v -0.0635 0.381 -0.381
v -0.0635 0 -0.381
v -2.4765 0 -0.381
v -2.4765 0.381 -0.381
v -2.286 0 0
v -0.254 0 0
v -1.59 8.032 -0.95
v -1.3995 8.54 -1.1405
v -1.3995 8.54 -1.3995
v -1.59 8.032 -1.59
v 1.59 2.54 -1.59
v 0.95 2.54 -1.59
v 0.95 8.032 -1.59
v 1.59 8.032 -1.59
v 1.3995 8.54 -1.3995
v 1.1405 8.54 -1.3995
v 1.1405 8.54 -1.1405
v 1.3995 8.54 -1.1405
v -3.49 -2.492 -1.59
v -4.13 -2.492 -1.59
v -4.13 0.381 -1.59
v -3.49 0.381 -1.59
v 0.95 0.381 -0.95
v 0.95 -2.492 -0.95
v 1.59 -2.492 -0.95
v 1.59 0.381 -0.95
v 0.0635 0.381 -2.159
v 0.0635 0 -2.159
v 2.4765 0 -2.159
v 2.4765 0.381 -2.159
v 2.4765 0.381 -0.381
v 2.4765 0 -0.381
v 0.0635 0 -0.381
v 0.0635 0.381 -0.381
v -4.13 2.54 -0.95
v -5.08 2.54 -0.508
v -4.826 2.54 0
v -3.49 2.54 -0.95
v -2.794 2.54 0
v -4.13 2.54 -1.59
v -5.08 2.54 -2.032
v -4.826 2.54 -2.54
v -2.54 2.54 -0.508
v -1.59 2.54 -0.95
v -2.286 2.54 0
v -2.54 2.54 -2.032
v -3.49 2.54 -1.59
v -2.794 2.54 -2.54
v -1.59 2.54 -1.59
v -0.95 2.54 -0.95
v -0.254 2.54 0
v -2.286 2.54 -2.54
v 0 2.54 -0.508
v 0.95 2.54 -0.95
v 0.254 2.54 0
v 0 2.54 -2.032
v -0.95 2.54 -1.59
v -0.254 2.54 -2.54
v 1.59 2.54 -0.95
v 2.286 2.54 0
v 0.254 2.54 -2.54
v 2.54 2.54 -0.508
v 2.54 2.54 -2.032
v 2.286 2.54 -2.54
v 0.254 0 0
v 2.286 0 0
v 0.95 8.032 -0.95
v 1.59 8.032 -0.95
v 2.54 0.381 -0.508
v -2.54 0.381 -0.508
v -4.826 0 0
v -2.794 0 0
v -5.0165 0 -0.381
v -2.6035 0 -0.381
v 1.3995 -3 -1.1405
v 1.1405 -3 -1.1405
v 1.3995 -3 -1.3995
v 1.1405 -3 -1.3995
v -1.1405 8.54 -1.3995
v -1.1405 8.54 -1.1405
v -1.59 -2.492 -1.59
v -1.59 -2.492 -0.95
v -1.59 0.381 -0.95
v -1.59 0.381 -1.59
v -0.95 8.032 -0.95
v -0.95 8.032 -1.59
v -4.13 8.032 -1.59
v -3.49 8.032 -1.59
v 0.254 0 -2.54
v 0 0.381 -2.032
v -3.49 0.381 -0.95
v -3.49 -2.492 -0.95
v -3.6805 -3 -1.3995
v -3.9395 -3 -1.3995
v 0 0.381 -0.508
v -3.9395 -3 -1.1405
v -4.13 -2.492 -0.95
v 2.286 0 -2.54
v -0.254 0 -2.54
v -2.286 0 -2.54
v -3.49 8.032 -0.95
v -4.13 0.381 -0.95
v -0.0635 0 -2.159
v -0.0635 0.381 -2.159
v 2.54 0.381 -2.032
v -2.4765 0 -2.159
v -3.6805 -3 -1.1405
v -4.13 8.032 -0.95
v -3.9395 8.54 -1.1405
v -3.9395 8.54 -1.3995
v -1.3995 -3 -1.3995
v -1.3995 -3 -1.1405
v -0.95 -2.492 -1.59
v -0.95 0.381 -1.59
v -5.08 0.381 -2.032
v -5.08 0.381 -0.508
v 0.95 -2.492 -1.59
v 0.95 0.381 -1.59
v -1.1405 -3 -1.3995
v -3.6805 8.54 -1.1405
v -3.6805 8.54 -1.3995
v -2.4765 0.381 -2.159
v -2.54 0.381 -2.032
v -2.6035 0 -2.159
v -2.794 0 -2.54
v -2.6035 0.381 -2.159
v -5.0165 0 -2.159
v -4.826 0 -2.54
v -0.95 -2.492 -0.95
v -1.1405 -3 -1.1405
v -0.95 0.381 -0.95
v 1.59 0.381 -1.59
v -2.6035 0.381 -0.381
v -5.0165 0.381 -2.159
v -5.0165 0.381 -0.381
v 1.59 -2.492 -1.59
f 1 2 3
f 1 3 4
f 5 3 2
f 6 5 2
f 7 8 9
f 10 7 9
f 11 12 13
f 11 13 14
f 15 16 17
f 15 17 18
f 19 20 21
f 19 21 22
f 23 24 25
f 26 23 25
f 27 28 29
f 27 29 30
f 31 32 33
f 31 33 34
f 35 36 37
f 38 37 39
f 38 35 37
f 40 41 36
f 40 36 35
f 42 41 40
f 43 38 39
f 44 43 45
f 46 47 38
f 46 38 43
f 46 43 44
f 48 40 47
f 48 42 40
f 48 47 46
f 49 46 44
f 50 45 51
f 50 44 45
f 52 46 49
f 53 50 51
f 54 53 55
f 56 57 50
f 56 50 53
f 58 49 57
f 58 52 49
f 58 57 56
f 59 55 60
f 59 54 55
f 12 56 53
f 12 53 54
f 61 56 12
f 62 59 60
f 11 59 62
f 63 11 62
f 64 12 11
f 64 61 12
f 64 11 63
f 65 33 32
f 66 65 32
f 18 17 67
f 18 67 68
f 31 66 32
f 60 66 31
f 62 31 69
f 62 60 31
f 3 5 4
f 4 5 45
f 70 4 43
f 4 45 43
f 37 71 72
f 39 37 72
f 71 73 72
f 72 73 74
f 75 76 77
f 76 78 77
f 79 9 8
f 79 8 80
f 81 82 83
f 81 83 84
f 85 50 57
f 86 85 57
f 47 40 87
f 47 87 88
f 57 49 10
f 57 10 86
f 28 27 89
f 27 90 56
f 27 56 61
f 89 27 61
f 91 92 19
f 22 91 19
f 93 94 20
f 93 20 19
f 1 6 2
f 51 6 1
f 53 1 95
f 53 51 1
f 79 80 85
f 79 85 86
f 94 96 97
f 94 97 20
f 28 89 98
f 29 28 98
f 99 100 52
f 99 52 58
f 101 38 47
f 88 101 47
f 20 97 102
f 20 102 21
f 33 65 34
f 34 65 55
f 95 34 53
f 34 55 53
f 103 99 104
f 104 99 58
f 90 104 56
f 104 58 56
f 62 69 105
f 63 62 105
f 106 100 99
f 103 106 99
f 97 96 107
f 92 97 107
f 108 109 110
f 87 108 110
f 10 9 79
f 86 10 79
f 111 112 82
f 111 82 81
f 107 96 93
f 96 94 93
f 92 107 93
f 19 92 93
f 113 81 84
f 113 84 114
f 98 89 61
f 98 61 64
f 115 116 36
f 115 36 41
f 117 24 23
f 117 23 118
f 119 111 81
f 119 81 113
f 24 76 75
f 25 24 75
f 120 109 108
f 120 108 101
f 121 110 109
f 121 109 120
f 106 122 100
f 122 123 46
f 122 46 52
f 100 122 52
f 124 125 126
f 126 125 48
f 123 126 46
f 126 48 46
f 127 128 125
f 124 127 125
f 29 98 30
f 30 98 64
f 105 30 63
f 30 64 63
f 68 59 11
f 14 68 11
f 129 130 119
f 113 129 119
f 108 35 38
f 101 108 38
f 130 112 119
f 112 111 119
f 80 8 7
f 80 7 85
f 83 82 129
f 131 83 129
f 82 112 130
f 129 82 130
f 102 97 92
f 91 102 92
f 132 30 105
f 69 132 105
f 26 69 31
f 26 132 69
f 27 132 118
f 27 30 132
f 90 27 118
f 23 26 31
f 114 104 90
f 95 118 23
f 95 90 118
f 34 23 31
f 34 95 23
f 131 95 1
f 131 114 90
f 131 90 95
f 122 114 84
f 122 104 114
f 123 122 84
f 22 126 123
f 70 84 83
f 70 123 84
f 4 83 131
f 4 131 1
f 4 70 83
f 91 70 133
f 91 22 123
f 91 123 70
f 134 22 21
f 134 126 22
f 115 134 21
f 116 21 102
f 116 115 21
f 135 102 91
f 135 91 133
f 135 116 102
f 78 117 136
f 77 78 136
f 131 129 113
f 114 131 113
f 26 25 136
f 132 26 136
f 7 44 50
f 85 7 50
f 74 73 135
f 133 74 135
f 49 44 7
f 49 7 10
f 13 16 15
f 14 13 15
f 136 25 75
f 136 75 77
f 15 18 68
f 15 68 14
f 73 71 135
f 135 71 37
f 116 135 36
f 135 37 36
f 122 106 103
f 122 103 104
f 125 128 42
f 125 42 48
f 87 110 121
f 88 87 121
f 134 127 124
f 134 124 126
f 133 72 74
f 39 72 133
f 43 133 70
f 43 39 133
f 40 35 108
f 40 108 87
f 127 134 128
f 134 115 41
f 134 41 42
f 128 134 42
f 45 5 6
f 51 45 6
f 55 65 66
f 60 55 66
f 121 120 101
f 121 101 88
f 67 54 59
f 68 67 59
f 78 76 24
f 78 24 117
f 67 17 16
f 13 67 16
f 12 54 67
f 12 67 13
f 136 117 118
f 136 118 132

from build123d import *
from OCP.BRepFilletAPI import BRepFilletAPI_MakeChamfer

# Parameters (mm, degrees)
SKETCH1_W                     = 2.54
SKETCH1_H                     = 2.54
MAIN_BODY_DEPTH               = 2.54
SKETCH3_W                     = 1.778
SKETCH3_H                     = 0.381
CUT_EXTRUDE1_DEPTH            = 5.399409051
CUT_EXTRUDE2_DEPTH            = 5.399409051
BODY_PATTERN_COUNT            = 3
BODY_PATTERN_PITCH            = 2.54
PIN_START                     = -5.54
SKETCH2_W                     = 0.64
SKETCH2_H                     = 0.64
PIN_DEPTH                     = 11.54
CHAMFER1_SIZE                 = 0.508
CHAMFER1_SIZE2                = 0.1905
CHAMFER2_SIZE                 = 0.1905
CHAMFER2_SIZE2                = 0.508
PIN_PATTERN_COUNT             = 3
PIN_PATTERN_PITCH             = 2.54
CHAMFER1_OF_PIN_PATTERN_SIZE  = 0.508
CHAMFER1_OF_PIN_PATTERN_SIZE2 = 0.1905
CHAMFER2_OF_PIN_PATTERN_SIZE2 = 0.1905
CHAMFER2_OF_PIN_PATTERN_SIZE  = 0.508


with BuildPart() as part:
    # Sketch1 → Main Body (new body)
    with BuildSketch(Plane(origin=(0, 0, 0), x_dir=(1, 0, 0), z_dir=(0, 1, 0))):
        with Locations((1.27, 1.27)):
            Rectangle(SKETCH1_W, SKETCH1_H)
    main_body = extrude(amount=MAIN_BODY_DEPTH)

    # Sketch3 → Cut-Extrude1 (cut, through all)
    with BuildSketch(Plane.ZY):
        with Locations((-1.27, 0.1905)):
            Rectangle(SKETCH3_W, SKETCH3_H)
    cut_extrude1 = extrude(amount=-CUT_EXTRUDE1_DEPTH, mode=Mode.SUBTRACT)

    # Sketch4 → Cut-Extrude2 (cut, through all)
    with BuildSketch(Plane(origin=(0, 2.54, 0), x_dir=(1, 0, 0), z_dir=(0, 1, 0))):
        Polygon((0.254, 2.54), (0, 2.54), (0, 2.032), align=None)
        Polygon((2.54, 2.54), (2.286, 2.54), (2.54, 2.032), align=None)
        Polygon((0.254, 0), (0, 0.508), (0, 0), align=None)
        Polygon((2.54, 0), (2.286, 0), (2.54, 0.508), align=None)
    cut_extrude2 = extrude(amount=-CUT_EXTRUDE2_DEPTH, mode=Mode.SUBTRACT)

    # Body Pattern: Main Body, Cut-Extrude1, Cut-Extrude2 ×3
    with Locations(*[(-i * BODY_PATTERN_PITCH, 0, 0) for i in range(1, BODY_PATTERN_COUNT)]):
        add(main_body)
        add(cut_extrude1, mode=Mode.SUBTRACT)
        add(cut_extrude2, mode=Mode.SUBTRACT)

    # Sketch2 → Pin (add)
    with BuildSketch(Plane(origin=(0, 2.54, 0), x_dir=(1, 0, 0), z_dir=(0, 1, 0)).offset(PIN_START)):
        with Locations((1.27, 1.27)):
            Rectangle(SKETCH2_W, SKETCH2_H)
    pin = extrude(amount=PIN_DEPTH)

    # Chamfer1: one chamfer whose edges measure the first distance from different faces: ONE call of the kernel's chamfer builder (chamfer() names one face for all edges)
    chamfer1_edges_1 = [part.edges().sort_by_distance(p)[0] for p in [
        (0.95, 8.54, -1.27),
    ]]
    chamfer1_side_1 = [part.faces().sort_by_distance(p)[0] for p in [
        (0.95, 5.54, -1.27),
    ]]
    chamfer1_edges_2 = [part.edges().sort_by_distance(p)[0] for p in [
        (1.27, 8.54, -0.95),
    ]]
    chamfer1_side_2 = [part.faces().sort_by_distance(p)[0] for p in [
        (1.27, 5.54, -0.95),
    ]]
    chamfer1_edges_3 = [part.edges().sort_by_distance(p)[0] for p in [
        (1.59, 8.54, -1.27),
    ]]
    chamfer1_side_3 = [part.faces().sort_by_distance(p)[0] for p in [
        (1.59, 5.54, -1.27),
    ]]
    chamfer1_edges_4 = [part.edges().sort_by_distance(p)[0] for p in [
        (1.27, 8.54, -1.59),
    ]]
    chamfer1_side_4 = [part.faces().sort_by_distance(p)[0] for p in [
        (1.27, 5.54, -1.59),
    ]]
    chamfer1 = BRepFilletAPI_MakeChamfer(part.part.solid().wrapped)
    for e in chamfer1_edges_1:
        chamfer1.Add(CHAMFER1_SIZE, CHAMFER1_SIZE2, e.wrapped, chamfer1_side_1[0].wrapped)  # the first distance lies on this face
    for e in chamfer1_edges_2:
        chamfer1.Add(CHAMFER1_SIZE, CHAMFER1_SIZE2, e.wrapped, chamfer1_side_2[0].wrapped)  # the first distance lies on this face
    for e in chamfer1_edges_3:
        chamfer1.Add(CHAMFER1_SIZE, CHAMFER1_SIZE2, e.wrapped, chamfer1_side_3[0].wrapped)  # the first distance lies on this face
    for e in chamfer1_edges_4:
        chamfer1.Add(CHAMFER1_SIZE, CHAMFER1_SIZE2, e.wrapped, chamfer1_side_4[0].wrapped)  # the first distance lies on this face
    add(Compound.cast(chamfer1.Shape()), mode=Mode.REPLACE)

    # Chamfer2
    chamfer2_edges = [part.edges().sort_by_distance(p)[0] for p in [
        (1.27, -3, -0.95),
        (1.59, -3, -1.27),
        (1.27, -3, -1.59),
        (0.95, -3, -1.27),
    ]]
    chamfer2_side = [part.faces().sort_by_distance(p)[0] for p in [
        (1.27, -3, -1.27),
    ]]
    chamfer(chamfer2_edges, length=CHAMFER2_SIZE, length2=CHAMFER2_SIZE2, reference=chamfer2_side[0])

    # Pin Pattern: Pin ×3
    with Locations(*[(-i * PIN_PATTERN_PITCH, 0, 0) for i in range(1, PIN_PATTERN_COUNT)]):
        add(pin)

    # Chamfer1 of Pin Pattern: one chamfer whose edges measure the first distance from different faces: ONE call of the kernel's chamfer builder (chamfer() names one face for all edges)
    chamfer1_of_pin_pattern_edges_1 = [part.edges().sort_by_distance(p)[0] for p in [
        (-1.59, 8.54, -1.27),
    ]]
    chamfer1_of_pin_pattern_side_1 = [part.faces().sort_by_distance(p)[0] for p in [
        (-1.59, 5.54, -1.27),
    ]]
    chamfer1_of_pin_pattern_edges_2 = [part.edges().sort_by_distance(p)[0] for p in [
        (-1.27, 8.54, -0.95),
    ]]
    chamfer1_of_pin_pattern_side_2 = [part.faces().sort_by_distance(p)[0] for p in [
        (-1.27, 5.54, -0.95),
    ]]
    chamfer1_of_pin_pattern_edges_3 = [part.edges().sort_by_distance(p)[0] for p in [
        (-0.95, 8.54, -1.27),
    ]]
    chamfer1_of_pin_pattern_side_3 = [part.faces().sort_by_distance(p)[0] for p in [
        (-0.95, 5.54, -1.27),
    ]]
    chamfer1_of_pin_pattern_edges_4 = [part.edges().sort_by_distance(p)[0] for p in [
        (-1.27, 8.54, -1.59),
    ]]
    chamfer1_of_pin_pattern_side_4 = [part.faces().sort_by_distance(p)[0] for p in [
        (-1.27, 5.54, -1.59),
    ]]
    chamfer1_of_pin_pattern_edges_5 = [part.edges().sort_by_distance(p)[0] for p in [
        (-4.13, 8.54, -1.27),
    ]]
    chamfer1_of_pin_pattern_side_5 = [part.faces().sort_by_distance(p)[0] for p in [
        (-4.13, 5.54, -1.27),
    ]]
    chamfer1_of_pin_pattern_edges_6 = [part.edges().sort_by_distance(p)[0] for p in [
        (-3.81, 8.54, -0.95),
    ]]
    chamfer1_of_pin_pattern_side_6 = [part.faces().sort_by_distance(p)[0] for p in [
        (-3.81, 5.54, -0.95),
    ]]
    chamfer1_of_pin_pattern_edges_7 = [part.edges().sort_by_distance(p)[0] for p in [
        (-3.49, 8.54, -1.27),
    ]]
    chamfer1_of_pin_pattern_side_7 = [part.faces().sort_by_distance(p)[0] for p in [
        (-3.49, 5.54, -1.27),
    ]]
    chamfer1_of_pin_pattern_edges_8 = [part.edges().sort_by_distance(p)[0] for p in [
        (-3.81, 8.54, -1.59),
    ]]
    chamfer1_of_pin_pattern_side_8 = [part.faces().sort_by_distance(p)[0] for p in [
        (-3.81, 5.54, -1.59),
    ]]
    chamfer1_of_pin_pattern = BRepFilletAPI_MakeChamfer(part.part.solid().wrapped)
    for e in chamfer1_of_pin_pattern_edges_1:
        chamfer1_of_pin_pattern.Add(CHAMFER1_OF_PIN_PATTERN_SIZE, CHAMFER1_OF_PIN_PATTERN_SIZE2, e.wrapped, chamfer1_of_pin_pattern_side_1[0].wrapped)  # the first distance lies on this face
    for e in chamfer1_of_pin_pattern_edges_2:
        chamfer1_of_pin_pattern.Add(CHAMFER1_OF_PIN_PATTERN_SIZE, CHAMFER1_OF_PIN_PATTERN_SIZE2, e.wrapped, chamfer1_of_pin_pattern_side_2[0].wrapped)  # the first distance lies on this face
    for e in chamfer1_of_pin_pattern_edges_3:
        chamfer1_of_pin_pattern.Add(CHAMFER1_OF_PIN_PATTERN_SIZE, CHAMFER1_OF_PIN_PATTERN_SIZE2, e.wrapped, chamfer1_of_pin_pattern_side_3[0].wrapped)  # the first distance lies on this face
    for e in chamfer1_of_pin_pattern_edges_4:
        chamfer1_of_pin_pattern.Add(CHAMFER1_OF_PIN_PATTERN_SIZE, CHAMFER1_OF_PIN_PATTERN_SIZE2, e.wrapped, chamfer1_of_pin_pattern_side_4[0].wrapped)  # the first distance lies on this face
    for e in chamfer1_of_pin_pattern_edges_5:
        chamfer1_of_pin_pattern.Add(CHAMFER1_OF_PIN_PATTERN_SIZE, CHAMFER1_OF_PIN_PATTERN_SIZE2, e.wrapped, chamfer1_of_pin_pattern_side_5[0].wrapped)  # the first distance lies on this face
    for e in chamfer1_of_pin_pattern_edges_6:
        chamfer1_of_pin_pattern.Add(CHAMFER1_OF_PIN_PATTERN_SIZE, CHAMFER1_OF_PIN_PATTERN_SIZE2, e.wrapped, chamfer1_of_pin_pattern_side_6[0].wrapped)  # the first distance lies on this face
    for e in chamfer1_of_pin_pattern_edges_7:
        chamfer1_of_pin_pattern.Add(CHAMFER1_OF_PIN_PATTERN_SIZE, CHAMFER1_OF_PIN_PATTERN_SIZE2, e.wrapped, chamfer1_of_pin_pattern_side_7[0].wrapped)  # the first distance lies on this face
    for e in chamfer1_of_pin_pattern_edges_8:
        chamfer1_of_pin_pattern.Add(CHAMFER1_OF_PIN_PATTERN_SIZE, CHAMFER1_OF_PIN_PATTERN_SIZE2, e.wrapped, chamfer1_of_pin_pattern_side_8[0].wrapped)  # the first distance lies on this face
    add(Compound.cast(chamfer1_of_pin_pattern.Shape()), mode=Mode.REPLACE)

    # Chamfer2 of Pin Pattern
    chamfer2_of_pin_pattern_edges = [part.edges().sort_by_distance(p)[0] for p in [
        (-1.27, -3, -0.95),
        (-0.95, -3, -1.27),
        (-1.27, -3, -1.59),
        (-1.59, -3, -1.27),
        (-3.81, -3, -0.95),
        (-3.49, -3, -1.27),
        (-3.81, -3, -1.59),
        (-4.13, -3, -1.27),
    ]]
    chamfer(chamfer2_of_pin_pattern_edges, length=CHAMFER2_OF_PIN_PATTERN_SIZE, length2=CHAMFER2_OF_PIN_PATTERN_SIZE2)


solid = part.part
